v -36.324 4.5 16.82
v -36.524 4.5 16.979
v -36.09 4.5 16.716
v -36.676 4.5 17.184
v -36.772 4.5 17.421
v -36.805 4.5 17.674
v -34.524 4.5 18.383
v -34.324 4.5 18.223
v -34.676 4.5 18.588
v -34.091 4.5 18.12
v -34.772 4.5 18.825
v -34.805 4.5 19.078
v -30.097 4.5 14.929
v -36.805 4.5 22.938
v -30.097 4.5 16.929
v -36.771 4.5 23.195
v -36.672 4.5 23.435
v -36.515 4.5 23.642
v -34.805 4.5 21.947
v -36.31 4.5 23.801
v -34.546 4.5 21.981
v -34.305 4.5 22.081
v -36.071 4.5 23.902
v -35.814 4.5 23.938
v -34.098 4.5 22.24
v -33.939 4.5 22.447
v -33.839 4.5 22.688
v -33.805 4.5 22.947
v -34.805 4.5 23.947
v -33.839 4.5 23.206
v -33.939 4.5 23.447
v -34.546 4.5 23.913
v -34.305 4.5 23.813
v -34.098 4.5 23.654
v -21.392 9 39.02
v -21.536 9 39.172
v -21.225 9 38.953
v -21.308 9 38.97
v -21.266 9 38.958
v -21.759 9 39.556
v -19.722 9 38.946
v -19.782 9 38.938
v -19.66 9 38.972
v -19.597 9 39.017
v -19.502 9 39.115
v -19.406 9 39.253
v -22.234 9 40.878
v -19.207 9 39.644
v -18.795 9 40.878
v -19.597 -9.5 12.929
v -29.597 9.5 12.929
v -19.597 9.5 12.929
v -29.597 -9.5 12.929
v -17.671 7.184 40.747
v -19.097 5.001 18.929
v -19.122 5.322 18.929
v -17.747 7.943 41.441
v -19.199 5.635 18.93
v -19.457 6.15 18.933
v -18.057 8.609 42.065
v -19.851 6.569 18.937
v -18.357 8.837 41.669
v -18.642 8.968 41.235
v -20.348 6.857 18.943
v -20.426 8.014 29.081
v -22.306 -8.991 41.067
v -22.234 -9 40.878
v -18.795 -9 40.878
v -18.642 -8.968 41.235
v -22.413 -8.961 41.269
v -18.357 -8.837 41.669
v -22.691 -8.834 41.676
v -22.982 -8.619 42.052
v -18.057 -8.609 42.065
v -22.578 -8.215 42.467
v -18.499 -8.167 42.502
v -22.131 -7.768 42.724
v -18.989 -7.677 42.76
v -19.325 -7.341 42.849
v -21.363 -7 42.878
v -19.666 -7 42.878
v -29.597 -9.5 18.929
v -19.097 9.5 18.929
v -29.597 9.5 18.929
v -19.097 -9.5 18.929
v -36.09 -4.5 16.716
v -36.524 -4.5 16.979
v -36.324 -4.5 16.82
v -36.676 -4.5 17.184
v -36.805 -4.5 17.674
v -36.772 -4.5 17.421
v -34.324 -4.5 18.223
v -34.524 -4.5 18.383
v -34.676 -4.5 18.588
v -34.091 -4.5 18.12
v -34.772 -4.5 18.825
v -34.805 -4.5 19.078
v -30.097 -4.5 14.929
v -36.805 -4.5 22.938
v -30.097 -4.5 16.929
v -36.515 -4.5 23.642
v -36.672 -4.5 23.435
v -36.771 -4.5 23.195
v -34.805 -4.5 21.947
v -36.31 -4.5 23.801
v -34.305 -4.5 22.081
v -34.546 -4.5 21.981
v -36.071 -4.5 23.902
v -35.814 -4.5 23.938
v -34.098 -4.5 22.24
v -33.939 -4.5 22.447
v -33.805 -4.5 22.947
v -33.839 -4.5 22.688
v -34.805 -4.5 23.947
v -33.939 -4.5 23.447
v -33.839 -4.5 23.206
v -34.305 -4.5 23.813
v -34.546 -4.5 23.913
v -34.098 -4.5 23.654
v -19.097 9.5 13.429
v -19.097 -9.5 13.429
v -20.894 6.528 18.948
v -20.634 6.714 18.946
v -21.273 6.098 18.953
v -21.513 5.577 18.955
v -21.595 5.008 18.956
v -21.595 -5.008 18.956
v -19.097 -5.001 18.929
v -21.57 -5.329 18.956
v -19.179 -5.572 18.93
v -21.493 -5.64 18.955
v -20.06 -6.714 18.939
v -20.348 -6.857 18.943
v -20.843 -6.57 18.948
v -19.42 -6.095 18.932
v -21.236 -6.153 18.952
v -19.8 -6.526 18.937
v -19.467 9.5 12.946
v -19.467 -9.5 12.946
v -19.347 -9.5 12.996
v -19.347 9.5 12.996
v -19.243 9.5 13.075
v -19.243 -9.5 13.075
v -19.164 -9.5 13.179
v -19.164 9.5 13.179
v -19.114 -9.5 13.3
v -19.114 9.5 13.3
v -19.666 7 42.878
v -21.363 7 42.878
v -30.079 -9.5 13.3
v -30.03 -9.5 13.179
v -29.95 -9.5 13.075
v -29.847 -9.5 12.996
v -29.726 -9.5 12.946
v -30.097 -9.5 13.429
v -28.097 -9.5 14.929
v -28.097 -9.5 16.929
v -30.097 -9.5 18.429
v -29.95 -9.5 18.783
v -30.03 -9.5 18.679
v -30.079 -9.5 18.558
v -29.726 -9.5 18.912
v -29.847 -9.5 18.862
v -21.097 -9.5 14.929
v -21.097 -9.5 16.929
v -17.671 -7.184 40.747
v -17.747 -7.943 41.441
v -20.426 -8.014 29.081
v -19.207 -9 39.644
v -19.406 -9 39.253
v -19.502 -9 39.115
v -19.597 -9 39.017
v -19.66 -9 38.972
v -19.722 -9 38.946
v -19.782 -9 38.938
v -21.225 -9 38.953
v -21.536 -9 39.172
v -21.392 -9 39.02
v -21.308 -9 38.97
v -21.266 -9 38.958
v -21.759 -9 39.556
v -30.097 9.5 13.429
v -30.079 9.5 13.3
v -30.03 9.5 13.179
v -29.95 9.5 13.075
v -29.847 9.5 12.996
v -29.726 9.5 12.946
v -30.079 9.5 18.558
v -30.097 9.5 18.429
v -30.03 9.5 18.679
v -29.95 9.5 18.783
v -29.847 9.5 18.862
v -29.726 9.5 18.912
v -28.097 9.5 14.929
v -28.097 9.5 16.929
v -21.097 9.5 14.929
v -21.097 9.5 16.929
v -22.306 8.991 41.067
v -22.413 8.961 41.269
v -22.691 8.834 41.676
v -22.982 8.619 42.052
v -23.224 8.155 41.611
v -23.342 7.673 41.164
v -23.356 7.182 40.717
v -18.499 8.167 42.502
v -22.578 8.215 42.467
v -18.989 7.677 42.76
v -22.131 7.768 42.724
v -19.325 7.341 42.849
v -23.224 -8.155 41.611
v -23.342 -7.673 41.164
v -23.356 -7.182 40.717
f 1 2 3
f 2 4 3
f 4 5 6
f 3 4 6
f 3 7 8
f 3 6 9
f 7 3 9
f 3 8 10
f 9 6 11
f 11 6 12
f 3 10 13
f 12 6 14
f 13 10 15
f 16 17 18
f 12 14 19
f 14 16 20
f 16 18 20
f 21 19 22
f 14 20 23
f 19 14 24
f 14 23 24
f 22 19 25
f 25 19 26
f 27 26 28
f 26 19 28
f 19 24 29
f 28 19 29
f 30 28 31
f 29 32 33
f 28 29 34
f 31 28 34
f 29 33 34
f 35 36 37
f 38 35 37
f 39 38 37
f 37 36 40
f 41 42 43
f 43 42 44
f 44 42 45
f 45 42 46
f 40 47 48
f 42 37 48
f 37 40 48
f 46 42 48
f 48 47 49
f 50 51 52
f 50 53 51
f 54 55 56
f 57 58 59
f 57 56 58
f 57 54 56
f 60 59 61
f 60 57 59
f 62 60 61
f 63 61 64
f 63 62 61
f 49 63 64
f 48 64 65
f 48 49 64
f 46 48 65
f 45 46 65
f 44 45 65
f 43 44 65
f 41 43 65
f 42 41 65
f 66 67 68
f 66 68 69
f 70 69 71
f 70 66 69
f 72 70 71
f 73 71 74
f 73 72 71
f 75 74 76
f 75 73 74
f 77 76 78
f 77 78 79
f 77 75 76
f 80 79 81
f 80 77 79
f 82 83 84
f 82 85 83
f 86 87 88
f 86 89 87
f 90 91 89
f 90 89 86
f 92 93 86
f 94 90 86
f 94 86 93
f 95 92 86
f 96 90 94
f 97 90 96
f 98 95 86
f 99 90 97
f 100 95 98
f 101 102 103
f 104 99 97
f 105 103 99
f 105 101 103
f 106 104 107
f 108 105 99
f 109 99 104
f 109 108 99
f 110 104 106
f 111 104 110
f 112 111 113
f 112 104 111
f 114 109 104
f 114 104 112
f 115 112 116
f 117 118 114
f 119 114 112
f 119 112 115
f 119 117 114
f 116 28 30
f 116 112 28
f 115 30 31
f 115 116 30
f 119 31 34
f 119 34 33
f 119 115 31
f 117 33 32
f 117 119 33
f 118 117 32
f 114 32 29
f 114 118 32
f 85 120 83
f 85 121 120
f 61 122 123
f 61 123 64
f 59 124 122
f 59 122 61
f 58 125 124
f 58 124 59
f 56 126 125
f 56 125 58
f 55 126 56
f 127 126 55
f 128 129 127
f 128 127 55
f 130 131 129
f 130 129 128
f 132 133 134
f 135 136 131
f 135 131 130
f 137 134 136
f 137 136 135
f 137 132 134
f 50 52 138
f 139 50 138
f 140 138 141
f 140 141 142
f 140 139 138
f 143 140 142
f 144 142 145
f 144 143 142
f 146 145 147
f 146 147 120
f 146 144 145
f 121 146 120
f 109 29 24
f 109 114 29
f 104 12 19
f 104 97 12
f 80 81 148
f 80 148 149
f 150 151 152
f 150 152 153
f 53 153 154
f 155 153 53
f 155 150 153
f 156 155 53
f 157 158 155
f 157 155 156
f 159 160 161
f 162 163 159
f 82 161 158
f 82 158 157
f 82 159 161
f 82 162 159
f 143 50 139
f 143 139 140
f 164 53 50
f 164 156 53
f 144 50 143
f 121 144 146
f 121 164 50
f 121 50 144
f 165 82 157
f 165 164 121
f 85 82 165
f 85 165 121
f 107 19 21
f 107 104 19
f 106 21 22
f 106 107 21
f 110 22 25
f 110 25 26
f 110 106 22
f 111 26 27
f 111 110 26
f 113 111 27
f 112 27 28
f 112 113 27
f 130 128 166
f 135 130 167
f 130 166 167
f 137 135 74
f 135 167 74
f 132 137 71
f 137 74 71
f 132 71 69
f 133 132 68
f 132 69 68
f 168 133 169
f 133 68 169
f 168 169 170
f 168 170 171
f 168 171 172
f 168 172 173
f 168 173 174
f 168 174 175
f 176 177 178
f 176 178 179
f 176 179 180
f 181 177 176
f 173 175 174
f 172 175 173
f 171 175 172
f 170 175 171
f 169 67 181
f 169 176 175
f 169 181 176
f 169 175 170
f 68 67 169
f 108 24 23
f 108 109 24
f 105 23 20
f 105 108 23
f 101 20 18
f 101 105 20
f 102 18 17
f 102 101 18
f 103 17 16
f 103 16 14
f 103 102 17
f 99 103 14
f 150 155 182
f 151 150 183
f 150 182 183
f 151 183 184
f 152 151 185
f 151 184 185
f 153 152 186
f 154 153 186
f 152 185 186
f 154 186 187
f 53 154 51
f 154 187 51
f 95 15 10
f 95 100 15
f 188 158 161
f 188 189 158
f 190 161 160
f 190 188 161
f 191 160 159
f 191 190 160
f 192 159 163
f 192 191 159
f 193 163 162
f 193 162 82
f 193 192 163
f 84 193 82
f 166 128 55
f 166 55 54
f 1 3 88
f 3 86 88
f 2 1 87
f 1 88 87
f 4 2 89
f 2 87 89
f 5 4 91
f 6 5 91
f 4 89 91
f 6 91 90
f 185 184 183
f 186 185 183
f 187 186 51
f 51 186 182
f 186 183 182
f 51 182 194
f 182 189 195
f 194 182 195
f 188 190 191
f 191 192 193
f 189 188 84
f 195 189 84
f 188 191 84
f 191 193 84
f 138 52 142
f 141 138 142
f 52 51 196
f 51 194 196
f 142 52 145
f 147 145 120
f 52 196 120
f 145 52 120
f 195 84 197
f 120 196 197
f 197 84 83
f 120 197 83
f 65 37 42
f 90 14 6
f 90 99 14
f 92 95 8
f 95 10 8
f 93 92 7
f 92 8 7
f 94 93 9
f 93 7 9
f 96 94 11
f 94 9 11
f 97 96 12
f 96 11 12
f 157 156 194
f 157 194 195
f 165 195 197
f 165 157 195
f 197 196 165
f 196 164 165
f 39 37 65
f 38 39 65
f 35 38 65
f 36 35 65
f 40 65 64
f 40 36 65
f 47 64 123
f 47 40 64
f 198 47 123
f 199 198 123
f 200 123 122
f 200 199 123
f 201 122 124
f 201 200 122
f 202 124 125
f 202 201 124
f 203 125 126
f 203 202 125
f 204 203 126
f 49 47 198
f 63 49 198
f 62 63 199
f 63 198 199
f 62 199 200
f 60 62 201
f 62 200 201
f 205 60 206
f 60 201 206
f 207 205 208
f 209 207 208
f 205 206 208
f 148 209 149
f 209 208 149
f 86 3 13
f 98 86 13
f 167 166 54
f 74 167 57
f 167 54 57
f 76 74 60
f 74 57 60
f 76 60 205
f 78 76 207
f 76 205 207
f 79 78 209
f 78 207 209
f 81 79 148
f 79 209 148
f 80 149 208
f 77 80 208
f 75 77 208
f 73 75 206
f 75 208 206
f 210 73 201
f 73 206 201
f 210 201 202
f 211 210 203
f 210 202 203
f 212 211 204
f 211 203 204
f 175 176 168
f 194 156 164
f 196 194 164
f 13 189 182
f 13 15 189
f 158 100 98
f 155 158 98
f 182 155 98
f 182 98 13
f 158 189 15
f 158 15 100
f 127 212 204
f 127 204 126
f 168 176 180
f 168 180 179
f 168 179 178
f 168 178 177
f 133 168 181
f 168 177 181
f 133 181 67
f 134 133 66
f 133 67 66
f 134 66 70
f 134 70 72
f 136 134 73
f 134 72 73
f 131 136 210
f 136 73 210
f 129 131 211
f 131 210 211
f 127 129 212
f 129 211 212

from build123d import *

# Parameters (mm, degrees)
F0_W         = 7
F0_H         = 2
F1_DEPTH     = 9.5
F2_DEPTH     = 9
F0_W_2       = 1
F3_DEPTH     = 4.5
F4_R         = 0.99999
F5_SIZE2     = 2
F5_SIZE      = 20
F5_2_SIZE2   = 2
F5_2_SIZE    = 20
F6_T1_DEPTH  = 49.9673321511
F6_T3_DEPTH  = 49.9117147518
F6_T5_DEPTH  = 49.9673321511
F6_T7_DEPTH  = 49.9117147518
F6_T9_DEPTH  = 28.6748999233
F6_T11_DEPTH = 28.841948309
F6_T13_DEPTH = 16
F7_R         = 0.5


# Not quite as in the source:
# - a fillet or chamfer that OpenCascade refuses, or shapes differently, is made with other operations: its cross-section is extruded or revolved along the edge and cut away or added
# - a fillet or chamfer is up to 0.001 mm smaller than in the source, because OpenCascade refuses the exact size


with BuildPart() as f1:
    # F0 (on Front) → F1 (new body, symmetric)
    with BuildSketch(Plane.XZ):
        Polygon((-30.0965141803, 12.928980055), (-19.0965141803, 12.928980055), (-19.0965141803, 18.928980055), (-30.0965141803, 18.928980055), (-30.0965141803, 16.928980055), (-30.0965141803, 14.928980055), align=None)
        with Locations((-24.5965141803, 15.928980055)):
            Rectangle(F0_W, F0_H, mode=Mode.SUBTRACT)
    extrude(amount=F1_DEPTH, both=True)

    # F0 (on Front) → F3 (join, symmetric)
    with BuildSketch(Plane.XZ):
        with Locations((-34.3048012789, 22.9472189589)):
            Rectangle(F0_W_2, F0_H)
        Polygon((-36.8047181128, 18.928980055), (-34.8048012789, 18.3327200564), (-34.8048012789, 21.9472189589), (-34.8048012789, 23.9472189589), (-36.8047181128, 23.928980055), align=None)
        Polygon((-36.8047181128, 16.928980055), (-30.0965141803, 14.928980055), (-30.0965141803, 16.928980055), (-34.8048012789, 18.3327200564), (-36.8047181128, 18.928980055), align=None)
    extrude(amount=F3_DEPTH, both=True)

    # F4 (radius 1 in the source; OpenCascade refuses exactly that, so slightly less here)
    f4_edges = [f1.edges().sort_by_distance(p)[0] for p in [
        (-36.804718, 0, 16.92898),
        (-36.804718, 0, 23.92898),
        (-33.804801, 0, 23.947219),
        (-33.804801, 0, 21.947219),
        (-34.804801, 0, 18.33272),
    ]]
    fillet(f4_edges, radius=F4_R)

    # F7
    f7_edges = [f1.edges().sort_by_distance(p)[0] for p in [
        (-30.096514, 0, 18.92898),
        (-30.096514, 0, 12.92898),
        (-19.096514, 0, 12.92898),
    ]]
    fillet(f7_edges, radius=F7_R)


with BuildPart() as f2:
    # F0 (on Front) → F2 (new body, symmetric)
    with BuildSketch(Plane.XZ):
        Polygon((-21.5954088979, 18.9560896729), (-19.0965141803, 18.928980055), (-17.531296789, 42.8778859699), (-23.531296789, 42.8778859699), align=None)
    extrude(amount=F2_DEPTH, both=True)

    # F5
    f5_edges = [f2.edges().sort_by_distance(p)[0] for p in [
        (-20.345962, -9, 18.942535),
    ]]
    f5_side = f2.faces().sort_by_distance((-20.450789, -9, 32.553702))[0]
    chamfer(f5_edges, length=F5_SIZE, length2=F5_SIZE2, reference=f5_side)

    # F5#2
    f5_2_edges = [f2.edges().sort_by_distance(p)[0] for p in [
        (-20.345962, 9, 18.942535),
    ]]
    f5_2_side = f2.faces().sort_by_distance((-20.450789, 9, 32.553702))[0]
    chamfer(f5_2_edges, length=F5_2_SIZE, length2=F5_2_SIZE2, reference=f5_2_side)

    # F6: fillet of radius 2 on 8 edges, made by hand

    # F6_s2 → F6_t1 (cut)
    with BuildSketch(Plane(origin=(4.1043145221, -6.2839672171, 62.7988437139), x_dir=(-0.8372400542, -0.5468355251, 0), z_dir=(-0.0648946801, 0.0993578929, -0.9929333762))):
        with BuildLine():
            ThreePointArc((18.7230377702, 8.4578509385), (19.9843267844, 7.5993584569), (21.4840038751, 7.8801215992))
            Line((21.4840038751, 7.8801215992), (19.8162152443, 6.7959541073))
            Line((19.8162152443, 6.7959541073), (18.7230377702, 8.4578509385))
        make_face()
    extrude(amount=F6_T1_DEPTH, mode=Mode.SUBTRACT)

    # F6_s4 → F6_t3 (cut)
    with BuildSketch(Plane(origin=(-5.3123669205, -6.5583508113, 65.6449993364), x_dir=(-0.7770579233, 0.6294290936, 0), z_dir=(0.0802650099, 0.099090688, -0.9918359561))):
        with BuildLine():
            ThreePointArc((10.8285170374, -15.2199185563), (12.2892990823, -15.648377047), (13.6285019913, -14.9245010705))
            Line((13.6285019913, -14.9245010705), (12.3748799347, -16.4595175875))
            Line((12.3748799347, -16.4595175875), (10.8285170374, -15.2199185563))
        make_face()
    extrude(amount=F6_T3_DEPTH, mode=Mode.SUBTRACT)

    # F6_s6 → F6_t5 (cut)
    with BuildSketch(Plane(origin=(4.1043145221, 6.2839672171, 62.7988437139), x_dir=(0.8372400542, -0.5468355251, 0), z_dir=(-0.0648946801, -0.0993578929, -0.9929333762))):
        with BuildLine():
            ThreePointArc((-18.7230377702, 8.4578509385), (-19.9843267844, 7.5993584569), (-21.4840038751, 7.8801215992))
            Line((-21.4840038751, 7.8801215992), (-19.8162152443, 6.7959541073))
            Line((-19.8162152443, 6.7959541073), (-18.7230377702, 8.4578509385))
        make_face()
    extrude(amount=F6_T5_DEPTH, mode=Mode.SUBTRACT)

    # F6_s8 → F6_t7 (cut)
    with BuildSketch(Plane(origin=(-5.3123669205, 6.5583508113, 65.6449993364), x_dir=(0.7770579233, 0.6294290936, 0), z_dir=(0.0802650099, -0.099090688, -0.9918359561))):
        with BuildLine():
            ThreePointArc((-10.8285170374, -15.2199185563), (-12.2892990823, -15.648377047), (-13.6285019913, -14.9245010705))
            Line((-13.6285019913, -14.9245010705), (-12.3748799347, -16.4595175875))
            Line((-12.3748799347, -16.4595175875), (-10.8285170374, -15.2199185563))
        make_face()
    extrude(amount=F6_T7_DEPTH, mode=Mode.SUBTRACT)

    # F6_s10 → F6_t9 (cut)
    with BuildSketch(Plane.XZ.offset(-14.3374499616)):
        with BuildLine():
            ThreePointArc((-17.6705346141, 40.7474511872), (-18.2066758753, 42.2452064215), (-19.6662767737, 42.8778859699))
            Line((-19.6662767737, 42.8778859699), (-17.531296789, 42.8778859699))
            Line((-17.531296789, 42.8778859699), (-17.6705346141, 40.7474511872))
        make_face()
    extrude(amount=F6_T9_DEPTH, mode=Mode.SUBTRACT)

    # F6_s12 → F6_t11 (cut)
    with BuildSketch(Plane.XZ.offset(-14.4209741545)):
        with BuildLine():
            ThreePointArc((-21.3629071272, 42.8778859699), (-22.8330513347, 42.2338638491), (-23.3563901519, 40.7165619789))
            Line((-23.3563901519, 40.7165619789), (-23.531296789, 42.8778859699))
            Line((-23.531296789, 42.8778859699), (-21.3629071272, 42.8778859699))
        make_face()
    extrude(amount=F6_T11_DEPTH, mode=Mode.SUBTRACT)

    # F6_s14 → F6_t13 (cut)
    with BuildSketch(Plane.YZ.offset(-28.531296789)):
        with BuildLine():
            ThreePointArc((-9, 40.8778859699), (-8.4142135624, 42.2920995322), (-7, 42.8778859699))
            Line((-7, 42.8778859699), (-9, 42.8778859699))
            Line((-9, 42.8778859699), (-9, 40.8778859699))
        make_face()
        with BuildLine():
            ThreePointArc((9, 40.8778859699), (8.4142135624, 42.2920995322), (7, 42.8778859699))
            Line((7, 42.8778859699), (9, 42.8778859699))
            Line((9, 42.8778859699), (9, 40.8778859699))
        make_face()
    extrude(amount=F6_T13_DEPTH, mode=Mode.SUBTRACT)


solid = Compound([f1.part, f2.part])
